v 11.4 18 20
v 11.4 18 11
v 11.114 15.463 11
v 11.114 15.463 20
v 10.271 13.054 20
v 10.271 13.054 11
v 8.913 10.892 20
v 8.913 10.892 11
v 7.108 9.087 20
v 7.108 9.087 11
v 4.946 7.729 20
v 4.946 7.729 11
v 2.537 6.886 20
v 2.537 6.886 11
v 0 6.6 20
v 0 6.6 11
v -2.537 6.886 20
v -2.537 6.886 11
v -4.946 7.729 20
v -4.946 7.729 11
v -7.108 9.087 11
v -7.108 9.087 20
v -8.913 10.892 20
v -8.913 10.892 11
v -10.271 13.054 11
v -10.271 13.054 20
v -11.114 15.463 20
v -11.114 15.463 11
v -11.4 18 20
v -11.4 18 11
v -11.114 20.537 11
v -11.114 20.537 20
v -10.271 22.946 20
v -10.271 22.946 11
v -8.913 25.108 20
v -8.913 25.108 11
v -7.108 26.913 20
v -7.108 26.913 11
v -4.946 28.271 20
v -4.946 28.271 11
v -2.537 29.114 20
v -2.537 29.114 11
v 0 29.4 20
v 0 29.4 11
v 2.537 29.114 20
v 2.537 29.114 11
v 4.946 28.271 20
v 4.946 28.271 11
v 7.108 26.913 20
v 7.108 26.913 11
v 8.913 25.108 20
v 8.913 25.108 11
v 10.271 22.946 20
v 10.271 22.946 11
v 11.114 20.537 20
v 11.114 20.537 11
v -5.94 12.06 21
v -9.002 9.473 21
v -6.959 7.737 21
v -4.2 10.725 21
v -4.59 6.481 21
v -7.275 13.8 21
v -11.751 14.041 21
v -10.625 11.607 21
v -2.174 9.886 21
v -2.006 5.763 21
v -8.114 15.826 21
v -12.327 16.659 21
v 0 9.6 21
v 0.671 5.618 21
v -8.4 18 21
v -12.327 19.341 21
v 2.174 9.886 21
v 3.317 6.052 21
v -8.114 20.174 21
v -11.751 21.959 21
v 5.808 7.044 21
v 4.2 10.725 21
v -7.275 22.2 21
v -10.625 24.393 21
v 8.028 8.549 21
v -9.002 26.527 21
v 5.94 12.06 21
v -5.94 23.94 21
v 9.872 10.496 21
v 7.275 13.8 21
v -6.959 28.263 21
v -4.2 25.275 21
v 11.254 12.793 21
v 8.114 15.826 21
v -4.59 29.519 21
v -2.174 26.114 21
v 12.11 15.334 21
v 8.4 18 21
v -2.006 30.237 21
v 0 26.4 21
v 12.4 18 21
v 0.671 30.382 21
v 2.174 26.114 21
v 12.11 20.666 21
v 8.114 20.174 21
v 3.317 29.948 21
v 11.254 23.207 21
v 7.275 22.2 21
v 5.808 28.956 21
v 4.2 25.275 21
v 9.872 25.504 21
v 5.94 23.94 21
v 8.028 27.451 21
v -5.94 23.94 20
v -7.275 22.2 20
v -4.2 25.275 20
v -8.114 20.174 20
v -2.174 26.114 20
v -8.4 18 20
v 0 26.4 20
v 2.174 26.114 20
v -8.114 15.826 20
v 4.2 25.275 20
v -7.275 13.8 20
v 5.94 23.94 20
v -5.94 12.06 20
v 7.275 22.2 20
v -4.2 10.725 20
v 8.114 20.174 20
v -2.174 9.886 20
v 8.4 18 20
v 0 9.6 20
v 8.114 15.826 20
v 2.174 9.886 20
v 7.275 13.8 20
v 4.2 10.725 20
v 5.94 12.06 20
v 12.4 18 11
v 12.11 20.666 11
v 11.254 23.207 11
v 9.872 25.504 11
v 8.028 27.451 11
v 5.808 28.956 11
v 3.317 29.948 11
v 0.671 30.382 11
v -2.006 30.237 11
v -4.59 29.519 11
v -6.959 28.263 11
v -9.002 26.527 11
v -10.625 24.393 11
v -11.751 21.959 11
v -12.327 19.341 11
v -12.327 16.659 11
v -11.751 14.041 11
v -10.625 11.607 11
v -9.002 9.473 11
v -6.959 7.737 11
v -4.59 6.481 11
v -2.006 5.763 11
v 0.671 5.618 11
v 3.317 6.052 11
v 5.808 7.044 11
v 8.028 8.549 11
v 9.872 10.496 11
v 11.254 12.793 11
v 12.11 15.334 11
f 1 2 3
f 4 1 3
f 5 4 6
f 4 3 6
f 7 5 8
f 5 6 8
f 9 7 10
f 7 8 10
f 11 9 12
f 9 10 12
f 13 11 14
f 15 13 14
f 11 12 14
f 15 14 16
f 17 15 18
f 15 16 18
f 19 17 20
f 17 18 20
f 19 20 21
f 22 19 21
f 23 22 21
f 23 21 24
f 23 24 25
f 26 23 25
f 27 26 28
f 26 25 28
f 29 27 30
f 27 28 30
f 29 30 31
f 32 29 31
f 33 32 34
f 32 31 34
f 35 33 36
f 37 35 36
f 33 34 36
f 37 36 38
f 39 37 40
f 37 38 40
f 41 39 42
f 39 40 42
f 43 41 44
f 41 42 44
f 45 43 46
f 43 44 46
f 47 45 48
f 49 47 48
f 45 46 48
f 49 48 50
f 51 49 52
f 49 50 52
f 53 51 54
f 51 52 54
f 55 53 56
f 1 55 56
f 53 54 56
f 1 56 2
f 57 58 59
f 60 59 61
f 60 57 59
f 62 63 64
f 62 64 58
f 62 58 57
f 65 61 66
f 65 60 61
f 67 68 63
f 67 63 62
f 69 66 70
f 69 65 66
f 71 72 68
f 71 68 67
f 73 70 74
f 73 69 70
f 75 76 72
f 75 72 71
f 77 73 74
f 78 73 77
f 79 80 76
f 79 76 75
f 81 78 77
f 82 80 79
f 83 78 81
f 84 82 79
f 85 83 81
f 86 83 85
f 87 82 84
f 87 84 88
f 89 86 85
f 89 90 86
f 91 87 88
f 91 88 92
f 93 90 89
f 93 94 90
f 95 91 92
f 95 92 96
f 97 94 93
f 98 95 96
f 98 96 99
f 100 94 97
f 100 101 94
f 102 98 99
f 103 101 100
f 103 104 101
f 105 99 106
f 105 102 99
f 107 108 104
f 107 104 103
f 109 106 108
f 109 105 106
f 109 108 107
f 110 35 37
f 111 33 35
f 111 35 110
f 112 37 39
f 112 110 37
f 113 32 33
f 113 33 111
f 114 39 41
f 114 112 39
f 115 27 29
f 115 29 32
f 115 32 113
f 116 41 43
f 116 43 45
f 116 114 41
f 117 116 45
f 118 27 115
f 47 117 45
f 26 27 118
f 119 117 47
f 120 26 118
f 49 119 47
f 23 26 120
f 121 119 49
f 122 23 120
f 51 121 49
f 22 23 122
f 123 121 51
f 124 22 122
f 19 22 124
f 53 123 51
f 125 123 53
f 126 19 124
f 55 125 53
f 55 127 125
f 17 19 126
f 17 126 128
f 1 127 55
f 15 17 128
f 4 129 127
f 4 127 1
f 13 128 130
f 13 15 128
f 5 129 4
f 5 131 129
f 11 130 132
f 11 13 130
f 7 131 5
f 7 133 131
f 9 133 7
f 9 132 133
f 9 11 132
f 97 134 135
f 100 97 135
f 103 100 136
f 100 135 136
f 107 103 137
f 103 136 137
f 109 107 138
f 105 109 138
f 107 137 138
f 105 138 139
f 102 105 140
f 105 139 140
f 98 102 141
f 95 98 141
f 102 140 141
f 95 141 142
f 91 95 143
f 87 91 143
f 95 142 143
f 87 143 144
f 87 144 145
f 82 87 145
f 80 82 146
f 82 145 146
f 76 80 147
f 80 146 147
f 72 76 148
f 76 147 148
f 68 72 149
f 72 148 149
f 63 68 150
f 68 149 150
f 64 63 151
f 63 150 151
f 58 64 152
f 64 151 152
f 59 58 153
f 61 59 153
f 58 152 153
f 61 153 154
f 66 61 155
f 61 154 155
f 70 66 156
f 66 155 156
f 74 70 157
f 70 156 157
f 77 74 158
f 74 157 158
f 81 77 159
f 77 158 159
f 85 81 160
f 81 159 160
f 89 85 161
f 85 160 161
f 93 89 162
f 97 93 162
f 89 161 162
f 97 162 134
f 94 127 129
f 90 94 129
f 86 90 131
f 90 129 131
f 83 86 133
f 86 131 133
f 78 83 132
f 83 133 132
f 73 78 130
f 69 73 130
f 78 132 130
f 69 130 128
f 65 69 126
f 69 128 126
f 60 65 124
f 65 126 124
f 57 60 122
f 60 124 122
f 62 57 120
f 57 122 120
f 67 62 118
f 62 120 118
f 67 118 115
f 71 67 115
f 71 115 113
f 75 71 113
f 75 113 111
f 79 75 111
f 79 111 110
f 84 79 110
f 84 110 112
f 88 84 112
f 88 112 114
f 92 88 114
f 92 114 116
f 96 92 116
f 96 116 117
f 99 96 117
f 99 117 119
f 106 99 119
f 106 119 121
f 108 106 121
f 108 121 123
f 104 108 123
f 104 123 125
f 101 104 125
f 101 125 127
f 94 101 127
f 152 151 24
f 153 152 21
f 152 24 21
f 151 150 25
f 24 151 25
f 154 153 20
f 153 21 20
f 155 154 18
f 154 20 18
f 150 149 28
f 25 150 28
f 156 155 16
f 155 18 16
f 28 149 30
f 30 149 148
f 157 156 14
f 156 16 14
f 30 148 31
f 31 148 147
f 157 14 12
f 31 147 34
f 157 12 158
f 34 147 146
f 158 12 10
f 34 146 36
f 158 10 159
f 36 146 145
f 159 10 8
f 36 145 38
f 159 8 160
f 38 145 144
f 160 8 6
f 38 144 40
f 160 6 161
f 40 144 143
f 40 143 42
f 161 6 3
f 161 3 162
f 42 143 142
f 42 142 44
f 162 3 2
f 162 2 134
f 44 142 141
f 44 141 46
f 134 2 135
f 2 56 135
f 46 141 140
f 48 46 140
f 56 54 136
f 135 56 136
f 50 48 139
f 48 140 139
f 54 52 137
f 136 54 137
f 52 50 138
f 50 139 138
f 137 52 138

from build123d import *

# Parameters (mm, degrees)
SKETCH032_R     = 12.4
PAD022_DEPTH    = 10
SKETCH033_R     = 11.4
POCKET009_DEPTH = 9
SKETCH034_R     = 8.4
POCKET010_DEPTH = 5


with BuildPart() as part:
    # Sketch032 → Pad022 (new body)
    with BuildSketch(Plane.XY):
        with Locations((0, 18)):
            Circle(SKETCH032_R)
    extrude(amount=PAD022_DEPTH)

    # Sketch033 (on Face2 of Pad022) → Pocket009 (cut)
    with BuildSketch(Plane(origin=(0, 0, 0), x_dir=(1, 0, 0), z_dir=(0, 0, -1))):
        with Locations((0, -18)):
            Circle(SKETCH033_R)
    extrude(amount=-POCKET009_DEPTH, mode=Mode.SUBTRACT)

    # Sketch034 (on Face5 of Pocket009) → Pocket010 (cut)
    with BuildSketch(Plane(origin=(0, 0, 9), x_dir=(1, 0, 0), z_dir=(0, 0, -1))):
        with Locations((0, -18)):
            Circle(SKETCH034_R)
    extrude(amount=-POCKET010_DEPTH, mode=Mode.SUBTRACT)


with BuildPart() as part_1:
    # Body039 placement: moved
    add(part.part.moved(Location((0, 0, 11))))


solid = part_1.part
